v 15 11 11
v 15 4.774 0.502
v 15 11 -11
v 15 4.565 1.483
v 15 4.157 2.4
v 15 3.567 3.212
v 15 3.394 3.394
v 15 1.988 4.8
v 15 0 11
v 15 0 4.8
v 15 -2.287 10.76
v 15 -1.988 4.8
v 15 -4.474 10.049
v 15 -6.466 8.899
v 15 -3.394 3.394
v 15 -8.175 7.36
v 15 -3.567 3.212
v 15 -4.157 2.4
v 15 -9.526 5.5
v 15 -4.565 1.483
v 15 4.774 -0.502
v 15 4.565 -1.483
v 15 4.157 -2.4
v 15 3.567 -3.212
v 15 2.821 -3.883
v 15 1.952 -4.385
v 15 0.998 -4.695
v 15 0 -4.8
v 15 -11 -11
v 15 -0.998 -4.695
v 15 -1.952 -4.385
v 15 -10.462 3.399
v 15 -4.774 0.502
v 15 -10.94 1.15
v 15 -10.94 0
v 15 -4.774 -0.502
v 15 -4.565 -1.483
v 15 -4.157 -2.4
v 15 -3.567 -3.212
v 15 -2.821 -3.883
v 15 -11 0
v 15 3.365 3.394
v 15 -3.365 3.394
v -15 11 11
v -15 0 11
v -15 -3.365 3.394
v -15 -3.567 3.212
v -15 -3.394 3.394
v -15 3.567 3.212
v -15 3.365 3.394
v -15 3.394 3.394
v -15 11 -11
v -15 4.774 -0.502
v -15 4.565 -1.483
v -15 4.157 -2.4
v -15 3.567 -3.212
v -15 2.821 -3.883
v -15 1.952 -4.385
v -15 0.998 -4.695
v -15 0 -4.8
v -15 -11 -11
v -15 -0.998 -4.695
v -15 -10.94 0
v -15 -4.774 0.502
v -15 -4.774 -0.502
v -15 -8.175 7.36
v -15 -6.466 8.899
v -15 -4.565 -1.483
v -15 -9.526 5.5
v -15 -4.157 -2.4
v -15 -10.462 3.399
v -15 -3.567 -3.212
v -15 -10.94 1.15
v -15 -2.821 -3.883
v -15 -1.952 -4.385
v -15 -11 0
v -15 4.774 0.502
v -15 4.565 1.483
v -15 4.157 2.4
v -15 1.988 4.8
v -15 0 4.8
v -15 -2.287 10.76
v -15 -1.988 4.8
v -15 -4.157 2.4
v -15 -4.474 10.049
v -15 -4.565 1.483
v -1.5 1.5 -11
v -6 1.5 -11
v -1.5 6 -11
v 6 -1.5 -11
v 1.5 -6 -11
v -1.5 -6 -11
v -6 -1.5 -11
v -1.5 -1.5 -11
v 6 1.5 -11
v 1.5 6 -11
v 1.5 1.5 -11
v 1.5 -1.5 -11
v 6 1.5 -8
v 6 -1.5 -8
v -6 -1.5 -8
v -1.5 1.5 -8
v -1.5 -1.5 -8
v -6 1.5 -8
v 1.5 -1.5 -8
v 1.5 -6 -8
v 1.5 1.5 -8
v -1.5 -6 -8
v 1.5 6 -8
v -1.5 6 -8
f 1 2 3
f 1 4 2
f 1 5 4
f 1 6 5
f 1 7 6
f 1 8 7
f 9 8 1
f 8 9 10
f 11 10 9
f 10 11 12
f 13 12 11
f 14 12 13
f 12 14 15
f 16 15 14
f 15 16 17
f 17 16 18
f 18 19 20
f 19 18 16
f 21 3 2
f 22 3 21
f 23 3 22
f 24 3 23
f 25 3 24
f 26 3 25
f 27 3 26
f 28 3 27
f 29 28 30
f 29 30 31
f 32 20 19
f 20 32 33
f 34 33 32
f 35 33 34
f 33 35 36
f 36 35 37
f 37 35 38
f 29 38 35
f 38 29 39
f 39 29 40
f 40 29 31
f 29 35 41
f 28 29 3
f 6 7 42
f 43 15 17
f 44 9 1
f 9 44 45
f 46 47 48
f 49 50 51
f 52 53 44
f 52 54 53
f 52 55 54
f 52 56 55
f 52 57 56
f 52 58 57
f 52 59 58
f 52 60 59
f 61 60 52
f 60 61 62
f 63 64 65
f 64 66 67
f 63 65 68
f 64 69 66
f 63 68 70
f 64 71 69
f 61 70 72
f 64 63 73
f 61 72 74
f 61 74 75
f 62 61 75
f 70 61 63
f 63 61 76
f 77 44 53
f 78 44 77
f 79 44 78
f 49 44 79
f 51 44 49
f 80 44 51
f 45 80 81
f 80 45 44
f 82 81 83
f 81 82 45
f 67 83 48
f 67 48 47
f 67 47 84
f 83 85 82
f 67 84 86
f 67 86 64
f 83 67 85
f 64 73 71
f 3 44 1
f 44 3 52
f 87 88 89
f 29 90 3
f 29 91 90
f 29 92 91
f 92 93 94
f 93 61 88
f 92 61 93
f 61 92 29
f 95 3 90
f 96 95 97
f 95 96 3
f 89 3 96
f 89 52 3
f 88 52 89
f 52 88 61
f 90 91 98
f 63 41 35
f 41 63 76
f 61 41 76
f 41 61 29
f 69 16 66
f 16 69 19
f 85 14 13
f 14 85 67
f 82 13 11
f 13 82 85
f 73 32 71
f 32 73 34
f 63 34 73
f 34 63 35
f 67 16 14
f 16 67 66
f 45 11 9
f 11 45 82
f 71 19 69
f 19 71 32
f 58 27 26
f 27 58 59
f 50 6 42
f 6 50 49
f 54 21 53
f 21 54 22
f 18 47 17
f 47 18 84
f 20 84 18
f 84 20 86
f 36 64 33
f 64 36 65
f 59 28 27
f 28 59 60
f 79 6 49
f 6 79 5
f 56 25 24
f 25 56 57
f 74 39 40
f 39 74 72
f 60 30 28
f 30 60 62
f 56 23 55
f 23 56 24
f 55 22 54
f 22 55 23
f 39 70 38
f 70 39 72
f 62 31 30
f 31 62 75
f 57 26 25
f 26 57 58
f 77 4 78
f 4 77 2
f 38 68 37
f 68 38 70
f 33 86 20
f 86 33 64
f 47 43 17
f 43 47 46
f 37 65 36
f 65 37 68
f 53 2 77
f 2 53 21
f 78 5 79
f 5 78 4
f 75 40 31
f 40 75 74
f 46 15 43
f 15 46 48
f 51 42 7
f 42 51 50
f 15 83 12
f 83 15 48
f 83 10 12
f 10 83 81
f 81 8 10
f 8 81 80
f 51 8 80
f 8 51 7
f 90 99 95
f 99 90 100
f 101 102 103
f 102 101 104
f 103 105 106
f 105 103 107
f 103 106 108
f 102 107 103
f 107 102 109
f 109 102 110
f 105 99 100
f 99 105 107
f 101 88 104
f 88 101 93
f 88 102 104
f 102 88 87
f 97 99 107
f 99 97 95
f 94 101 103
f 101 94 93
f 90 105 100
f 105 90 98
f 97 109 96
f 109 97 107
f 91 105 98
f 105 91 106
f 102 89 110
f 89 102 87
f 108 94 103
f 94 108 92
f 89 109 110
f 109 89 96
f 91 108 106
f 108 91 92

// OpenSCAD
/*
 * Copy & paste this into your copy of the Libs.scad library (http://www.thingiverse.com/thing:6021)
 * 
 * Since the top is cut at radius height of the theoretical cylinder inside the teardrop, 
 * it might be a problem when the bridged part at top of the flat teardrop sags a bit during printing. 
 * This might happen when the bridge gets longer, i.e. on larger teardrops.
 * As a countermeasure itÕs possible to add a little bit height to the cut "for luck". 
 * To do so, set the value of the luck parameter to the additional height. 
 * However, the default value of this parameter is 0 and simply can be omitted in most cases.
 *
 * 2011 Eberhard Rensch, Pleasant Software
 * License, GPL v2 or later
 */
 
module flatteardrop(radius=5, length=10, angle=90, luck=0) {
	//$fn=resolution(radius); // This only works when inside Libs.scad
							// If you use this module separately, comment this line out
							// and/or set $fn to an absolute value (e.g. $fn = 36)
		
	sx1 = radius * sin(-45);
	sx2 = radius * -sin(-45);
	sy = radius * -cos(-45);
	ex = 0;
	ey = (sin(-135) + cos(-135)) * radius;
	
	dx= ex-sx1;
	dy = ey-sy;
	
	eys = -radius-luck;
	dys = eys-sy;
	ex1 = sy+dys*dx/dy;
	ex2 = -ex1;
		
	rotate([0, angle, 0]) union() {
		linear_extrude(height = length, center = true, convexity = radius, twist = 0)
			circle(r = radius, center = true);
		linear_extrude(height = length, center = true, convexity = radius, twist = 0)
			polygon(points = [
				[sy, sx1],
				[sy, sx2],
				[eys, ex2],
				[eys, ex1]], 
				paths = [[0, 1, 2, 3]]);
	}
}

$fa = 12;
$fs = 0.5;

w = 60; // Smooth rod distance (center to center)

module screws() {
  for (x = [-w/2, w/2]) {
    translate([x, 0, 0]) {
      // Push-through M3 screw hole.
      translate([0, -6, 0]) rotate([0, 90, 0])
	cylinder(r=1.65, h=20, center=true);
      // M3 nut holder.
      translate([-x/5, -6, 0])
	rotate([30, 0, 0]) rotate([0, 90, 0])
	cylinder(r=3.3, h=2.3, center=true, $fn=6);
    }
  }
}

module bracket(h) {
  difference() {
    union() {
      translate([0, -1, 0]) cube([w+12, 22, h], center=true);
      // Sandwich mount.
      translate([-w/2, 10, 0]) cylinder(r=6, h=h, center=true);
      translate([w/2, 10, 0]) cylinder(r=6, h=h, center=true);
    }
    // Sandwich mount.
    translate([-w/2, 12, 0]) cylinder(r=1.9, h=h+1, center=true);
    translate([w/2, 12, 0]) cylinder(r=1.9, h=h+1, center=true);
    // Smooth rod mounting slots.
    for (x = [-w/2, w/2]) {
      translate([x, 0, 0]) {
	cylinder(r=4.2, h=h+1, center=true);
	translate([0, -10, 0]) cube([2, 20, h+1], center=true);
      }
    }
    // Belt path.
    translate([0, -5, 0]) cube([w-20, 20, h+1], center=true);
    translate([0, -9, 0]) cube([w-12, 20, h+1], center=true);
    translate([-w/2+10, 1, 0]) cylinder(r=4, h=h+1, center=true);
    translate([w/2-10, 1, 0]) cylinder(r=4, h=h+1, center=true);
  }
}

module rodholder(l,s) {
	difference() {
		union() {
			translate([-l/2,0,0]) cube([l,s,s], center=false);
			translate([-l/2,0,-s]) cube([l,s,s], center=false);
			translate([-l/2,-s,-s]) cube([l,s,s], center=false);
			rotate([0,90,0]) cylinder(r = s,h=l, center=true);
		}
		flatteardrop(radius=9.6/2, length=l+1, angle=90, luck=0);
      translate([0,0,-s]) cube([12,3,6],center = true);
      translate([0,0,-s]) cube([3,12,6],center = true);
	}
}

//translate([0, 0, 10]) bracket(20);

rodholder(l=30,s=11);
